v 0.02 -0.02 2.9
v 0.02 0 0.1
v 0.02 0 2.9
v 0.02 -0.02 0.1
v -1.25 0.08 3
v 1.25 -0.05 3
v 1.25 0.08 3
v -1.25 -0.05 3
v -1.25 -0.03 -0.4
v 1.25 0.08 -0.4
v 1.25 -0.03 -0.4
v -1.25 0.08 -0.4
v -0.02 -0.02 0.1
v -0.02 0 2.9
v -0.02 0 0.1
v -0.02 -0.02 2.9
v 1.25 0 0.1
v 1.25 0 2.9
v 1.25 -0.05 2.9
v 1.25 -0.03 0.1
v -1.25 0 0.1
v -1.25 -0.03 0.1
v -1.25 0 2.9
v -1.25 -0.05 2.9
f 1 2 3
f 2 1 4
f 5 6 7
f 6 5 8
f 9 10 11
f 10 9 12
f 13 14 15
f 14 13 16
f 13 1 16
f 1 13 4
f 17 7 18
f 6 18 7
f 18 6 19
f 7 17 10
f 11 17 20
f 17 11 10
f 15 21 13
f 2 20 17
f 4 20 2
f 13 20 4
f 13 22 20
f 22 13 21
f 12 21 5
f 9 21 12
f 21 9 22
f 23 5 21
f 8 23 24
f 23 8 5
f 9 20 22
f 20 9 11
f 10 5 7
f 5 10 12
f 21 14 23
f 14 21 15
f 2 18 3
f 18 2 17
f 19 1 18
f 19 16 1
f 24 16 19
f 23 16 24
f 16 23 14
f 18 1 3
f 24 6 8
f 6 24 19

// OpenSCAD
// Tent shell kit: wall. See lib/lodge_kit.scad.
include <lib/lodge_kit.scad>
kind = "tent";
wall_panel();
